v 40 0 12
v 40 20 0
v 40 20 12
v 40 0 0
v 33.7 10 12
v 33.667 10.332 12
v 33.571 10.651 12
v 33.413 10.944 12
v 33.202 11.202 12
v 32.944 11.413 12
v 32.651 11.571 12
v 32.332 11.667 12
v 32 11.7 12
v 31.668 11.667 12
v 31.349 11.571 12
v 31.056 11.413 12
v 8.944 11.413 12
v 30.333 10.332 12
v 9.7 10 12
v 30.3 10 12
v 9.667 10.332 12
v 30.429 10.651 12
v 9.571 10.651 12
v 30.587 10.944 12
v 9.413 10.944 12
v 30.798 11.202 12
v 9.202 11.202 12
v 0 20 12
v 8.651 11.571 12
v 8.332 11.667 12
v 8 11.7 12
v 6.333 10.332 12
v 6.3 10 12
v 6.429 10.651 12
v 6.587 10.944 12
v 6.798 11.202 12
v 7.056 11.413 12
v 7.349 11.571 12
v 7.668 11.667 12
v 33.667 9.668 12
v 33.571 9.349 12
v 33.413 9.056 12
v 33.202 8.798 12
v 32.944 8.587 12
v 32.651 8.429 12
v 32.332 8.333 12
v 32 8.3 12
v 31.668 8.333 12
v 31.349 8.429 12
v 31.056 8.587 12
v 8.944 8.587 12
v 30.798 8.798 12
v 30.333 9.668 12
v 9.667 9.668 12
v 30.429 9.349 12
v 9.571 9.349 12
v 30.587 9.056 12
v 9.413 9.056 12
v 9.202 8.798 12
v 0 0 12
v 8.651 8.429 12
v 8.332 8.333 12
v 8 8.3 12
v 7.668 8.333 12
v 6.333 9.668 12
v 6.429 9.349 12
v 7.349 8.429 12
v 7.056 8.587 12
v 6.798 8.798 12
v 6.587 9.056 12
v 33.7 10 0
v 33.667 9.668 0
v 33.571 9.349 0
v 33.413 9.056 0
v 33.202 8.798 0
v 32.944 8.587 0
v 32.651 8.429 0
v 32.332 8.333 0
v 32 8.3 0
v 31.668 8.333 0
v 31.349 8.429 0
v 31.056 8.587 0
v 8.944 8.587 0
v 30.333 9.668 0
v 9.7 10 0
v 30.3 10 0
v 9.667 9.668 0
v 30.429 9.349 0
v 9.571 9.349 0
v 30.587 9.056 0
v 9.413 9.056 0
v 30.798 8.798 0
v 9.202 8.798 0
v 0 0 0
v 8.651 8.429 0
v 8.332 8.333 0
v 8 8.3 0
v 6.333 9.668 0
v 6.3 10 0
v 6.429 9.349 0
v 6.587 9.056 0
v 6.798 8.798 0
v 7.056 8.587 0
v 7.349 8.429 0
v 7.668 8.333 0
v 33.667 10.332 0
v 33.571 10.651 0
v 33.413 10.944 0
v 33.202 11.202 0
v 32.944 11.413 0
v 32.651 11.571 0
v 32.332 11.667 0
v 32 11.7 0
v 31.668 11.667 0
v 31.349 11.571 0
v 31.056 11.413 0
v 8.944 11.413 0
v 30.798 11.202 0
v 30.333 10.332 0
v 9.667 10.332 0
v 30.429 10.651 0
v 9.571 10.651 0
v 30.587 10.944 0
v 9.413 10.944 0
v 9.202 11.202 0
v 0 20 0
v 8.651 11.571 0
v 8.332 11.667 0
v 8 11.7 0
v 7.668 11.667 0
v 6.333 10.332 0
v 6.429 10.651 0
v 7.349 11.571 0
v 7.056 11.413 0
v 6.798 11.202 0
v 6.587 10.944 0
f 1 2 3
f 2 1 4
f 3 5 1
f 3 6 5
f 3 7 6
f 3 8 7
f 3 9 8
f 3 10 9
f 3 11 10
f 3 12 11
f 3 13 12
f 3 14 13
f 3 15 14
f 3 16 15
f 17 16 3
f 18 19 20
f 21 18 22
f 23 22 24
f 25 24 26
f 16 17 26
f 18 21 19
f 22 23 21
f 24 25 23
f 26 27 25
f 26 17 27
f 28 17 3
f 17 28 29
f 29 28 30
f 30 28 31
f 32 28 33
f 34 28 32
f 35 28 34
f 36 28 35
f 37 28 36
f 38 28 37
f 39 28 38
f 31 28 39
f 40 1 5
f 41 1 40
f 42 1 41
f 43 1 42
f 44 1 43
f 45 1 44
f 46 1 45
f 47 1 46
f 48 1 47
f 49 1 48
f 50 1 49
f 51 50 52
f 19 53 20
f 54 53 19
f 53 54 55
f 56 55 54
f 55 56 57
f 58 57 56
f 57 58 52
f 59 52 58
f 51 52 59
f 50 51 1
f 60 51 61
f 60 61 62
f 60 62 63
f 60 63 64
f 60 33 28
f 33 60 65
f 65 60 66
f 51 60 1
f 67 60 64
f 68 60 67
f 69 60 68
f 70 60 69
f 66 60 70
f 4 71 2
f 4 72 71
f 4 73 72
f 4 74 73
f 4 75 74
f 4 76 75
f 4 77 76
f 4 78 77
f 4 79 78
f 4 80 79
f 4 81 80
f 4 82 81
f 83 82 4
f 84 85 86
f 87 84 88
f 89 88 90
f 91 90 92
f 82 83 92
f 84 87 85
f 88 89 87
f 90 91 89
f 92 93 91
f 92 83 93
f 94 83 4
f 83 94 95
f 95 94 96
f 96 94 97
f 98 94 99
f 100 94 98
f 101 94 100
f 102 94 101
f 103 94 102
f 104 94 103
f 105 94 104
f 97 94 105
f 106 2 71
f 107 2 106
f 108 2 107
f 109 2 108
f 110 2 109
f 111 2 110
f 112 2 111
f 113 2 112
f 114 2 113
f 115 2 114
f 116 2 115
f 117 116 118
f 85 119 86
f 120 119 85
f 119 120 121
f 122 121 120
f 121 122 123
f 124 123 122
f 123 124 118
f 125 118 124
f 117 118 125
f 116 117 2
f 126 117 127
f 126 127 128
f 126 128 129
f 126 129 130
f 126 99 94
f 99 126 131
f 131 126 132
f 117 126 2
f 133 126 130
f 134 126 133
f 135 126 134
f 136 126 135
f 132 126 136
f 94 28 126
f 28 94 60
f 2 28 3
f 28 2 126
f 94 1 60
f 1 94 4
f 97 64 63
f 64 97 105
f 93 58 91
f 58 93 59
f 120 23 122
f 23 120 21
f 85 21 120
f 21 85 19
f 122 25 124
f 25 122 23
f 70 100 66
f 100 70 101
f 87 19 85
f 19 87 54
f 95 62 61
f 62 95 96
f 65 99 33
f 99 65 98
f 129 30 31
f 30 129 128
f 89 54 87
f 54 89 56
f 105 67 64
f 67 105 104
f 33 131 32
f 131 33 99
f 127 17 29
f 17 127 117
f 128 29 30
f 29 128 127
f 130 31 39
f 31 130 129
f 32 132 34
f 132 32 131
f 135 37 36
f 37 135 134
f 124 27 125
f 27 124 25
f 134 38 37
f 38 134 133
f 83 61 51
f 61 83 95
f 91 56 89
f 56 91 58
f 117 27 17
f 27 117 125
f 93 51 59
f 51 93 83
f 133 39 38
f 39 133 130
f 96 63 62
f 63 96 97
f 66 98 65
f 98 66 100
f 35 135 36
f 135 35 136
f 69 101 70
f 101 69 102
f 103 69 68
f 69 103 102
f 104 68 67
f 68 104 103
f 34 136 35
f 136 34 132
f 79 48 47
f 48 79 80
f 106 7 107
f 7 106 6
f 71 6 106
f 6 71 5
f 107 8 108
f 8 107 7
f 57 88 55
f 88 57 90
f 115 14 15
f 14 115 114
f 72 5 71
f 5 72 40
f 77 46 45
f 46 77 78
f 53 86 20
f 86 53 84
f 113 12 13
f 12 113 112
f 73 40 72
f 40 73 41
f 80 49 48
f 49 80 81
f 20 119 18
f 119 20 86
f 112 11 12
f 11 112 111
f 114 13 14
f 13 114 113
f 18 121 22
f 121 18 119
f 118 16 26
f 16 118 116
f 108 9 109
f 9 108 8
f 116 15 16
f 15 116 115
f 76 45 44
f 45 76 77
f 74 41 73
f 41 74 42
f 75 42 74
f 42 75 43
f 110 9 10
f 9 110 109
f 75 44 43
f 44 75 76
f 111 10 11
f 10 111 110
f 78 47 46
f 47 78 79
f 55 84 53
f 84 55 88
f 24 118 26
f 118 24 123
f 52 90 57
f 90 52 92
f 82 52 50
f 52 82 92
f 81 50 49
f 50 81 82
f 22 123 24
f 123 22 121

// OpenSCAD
// ModuDeck donor chassis study: NOT a verified ThinkPad fit.
// Millimetres. 370x240 is an unconfirmed owner measurement.
$fn=32; W=370; D=240; t=3;
module plate(w,d,h){cube([w,d,h]);}
module shell(w,d,h){difference(){cube([w,d,h]);translate([t,t,t])cube([w-2*t,d-2*t,h]);}}
module hole(x,y,h){translate([x,y,-1])cylinder(d=3.4,h=h+2);}
module rail(n){difference(){cube([n,12,6]);for(x=[10:20:n-10])hole(x,6,6);}}
module rear(){difference(){cube([W-6,3,25]);translate([W/2-23,-1,6])cube([40,5,14]);for(x=[10,W-16])translate([x,-1,12])rotate([-90,0,0])cylinder(d=3.4,h=5);}}
module tray(){difference(){shell(W,D,30);translate([3,D-4,3])cube([W-6,6,27]);for(x=[15,W-15],y=[15,D-15])hole(x,y,30);}}
difference(){cube([40,20,12]);hole(8,10,12);hole(32,10,12);}
